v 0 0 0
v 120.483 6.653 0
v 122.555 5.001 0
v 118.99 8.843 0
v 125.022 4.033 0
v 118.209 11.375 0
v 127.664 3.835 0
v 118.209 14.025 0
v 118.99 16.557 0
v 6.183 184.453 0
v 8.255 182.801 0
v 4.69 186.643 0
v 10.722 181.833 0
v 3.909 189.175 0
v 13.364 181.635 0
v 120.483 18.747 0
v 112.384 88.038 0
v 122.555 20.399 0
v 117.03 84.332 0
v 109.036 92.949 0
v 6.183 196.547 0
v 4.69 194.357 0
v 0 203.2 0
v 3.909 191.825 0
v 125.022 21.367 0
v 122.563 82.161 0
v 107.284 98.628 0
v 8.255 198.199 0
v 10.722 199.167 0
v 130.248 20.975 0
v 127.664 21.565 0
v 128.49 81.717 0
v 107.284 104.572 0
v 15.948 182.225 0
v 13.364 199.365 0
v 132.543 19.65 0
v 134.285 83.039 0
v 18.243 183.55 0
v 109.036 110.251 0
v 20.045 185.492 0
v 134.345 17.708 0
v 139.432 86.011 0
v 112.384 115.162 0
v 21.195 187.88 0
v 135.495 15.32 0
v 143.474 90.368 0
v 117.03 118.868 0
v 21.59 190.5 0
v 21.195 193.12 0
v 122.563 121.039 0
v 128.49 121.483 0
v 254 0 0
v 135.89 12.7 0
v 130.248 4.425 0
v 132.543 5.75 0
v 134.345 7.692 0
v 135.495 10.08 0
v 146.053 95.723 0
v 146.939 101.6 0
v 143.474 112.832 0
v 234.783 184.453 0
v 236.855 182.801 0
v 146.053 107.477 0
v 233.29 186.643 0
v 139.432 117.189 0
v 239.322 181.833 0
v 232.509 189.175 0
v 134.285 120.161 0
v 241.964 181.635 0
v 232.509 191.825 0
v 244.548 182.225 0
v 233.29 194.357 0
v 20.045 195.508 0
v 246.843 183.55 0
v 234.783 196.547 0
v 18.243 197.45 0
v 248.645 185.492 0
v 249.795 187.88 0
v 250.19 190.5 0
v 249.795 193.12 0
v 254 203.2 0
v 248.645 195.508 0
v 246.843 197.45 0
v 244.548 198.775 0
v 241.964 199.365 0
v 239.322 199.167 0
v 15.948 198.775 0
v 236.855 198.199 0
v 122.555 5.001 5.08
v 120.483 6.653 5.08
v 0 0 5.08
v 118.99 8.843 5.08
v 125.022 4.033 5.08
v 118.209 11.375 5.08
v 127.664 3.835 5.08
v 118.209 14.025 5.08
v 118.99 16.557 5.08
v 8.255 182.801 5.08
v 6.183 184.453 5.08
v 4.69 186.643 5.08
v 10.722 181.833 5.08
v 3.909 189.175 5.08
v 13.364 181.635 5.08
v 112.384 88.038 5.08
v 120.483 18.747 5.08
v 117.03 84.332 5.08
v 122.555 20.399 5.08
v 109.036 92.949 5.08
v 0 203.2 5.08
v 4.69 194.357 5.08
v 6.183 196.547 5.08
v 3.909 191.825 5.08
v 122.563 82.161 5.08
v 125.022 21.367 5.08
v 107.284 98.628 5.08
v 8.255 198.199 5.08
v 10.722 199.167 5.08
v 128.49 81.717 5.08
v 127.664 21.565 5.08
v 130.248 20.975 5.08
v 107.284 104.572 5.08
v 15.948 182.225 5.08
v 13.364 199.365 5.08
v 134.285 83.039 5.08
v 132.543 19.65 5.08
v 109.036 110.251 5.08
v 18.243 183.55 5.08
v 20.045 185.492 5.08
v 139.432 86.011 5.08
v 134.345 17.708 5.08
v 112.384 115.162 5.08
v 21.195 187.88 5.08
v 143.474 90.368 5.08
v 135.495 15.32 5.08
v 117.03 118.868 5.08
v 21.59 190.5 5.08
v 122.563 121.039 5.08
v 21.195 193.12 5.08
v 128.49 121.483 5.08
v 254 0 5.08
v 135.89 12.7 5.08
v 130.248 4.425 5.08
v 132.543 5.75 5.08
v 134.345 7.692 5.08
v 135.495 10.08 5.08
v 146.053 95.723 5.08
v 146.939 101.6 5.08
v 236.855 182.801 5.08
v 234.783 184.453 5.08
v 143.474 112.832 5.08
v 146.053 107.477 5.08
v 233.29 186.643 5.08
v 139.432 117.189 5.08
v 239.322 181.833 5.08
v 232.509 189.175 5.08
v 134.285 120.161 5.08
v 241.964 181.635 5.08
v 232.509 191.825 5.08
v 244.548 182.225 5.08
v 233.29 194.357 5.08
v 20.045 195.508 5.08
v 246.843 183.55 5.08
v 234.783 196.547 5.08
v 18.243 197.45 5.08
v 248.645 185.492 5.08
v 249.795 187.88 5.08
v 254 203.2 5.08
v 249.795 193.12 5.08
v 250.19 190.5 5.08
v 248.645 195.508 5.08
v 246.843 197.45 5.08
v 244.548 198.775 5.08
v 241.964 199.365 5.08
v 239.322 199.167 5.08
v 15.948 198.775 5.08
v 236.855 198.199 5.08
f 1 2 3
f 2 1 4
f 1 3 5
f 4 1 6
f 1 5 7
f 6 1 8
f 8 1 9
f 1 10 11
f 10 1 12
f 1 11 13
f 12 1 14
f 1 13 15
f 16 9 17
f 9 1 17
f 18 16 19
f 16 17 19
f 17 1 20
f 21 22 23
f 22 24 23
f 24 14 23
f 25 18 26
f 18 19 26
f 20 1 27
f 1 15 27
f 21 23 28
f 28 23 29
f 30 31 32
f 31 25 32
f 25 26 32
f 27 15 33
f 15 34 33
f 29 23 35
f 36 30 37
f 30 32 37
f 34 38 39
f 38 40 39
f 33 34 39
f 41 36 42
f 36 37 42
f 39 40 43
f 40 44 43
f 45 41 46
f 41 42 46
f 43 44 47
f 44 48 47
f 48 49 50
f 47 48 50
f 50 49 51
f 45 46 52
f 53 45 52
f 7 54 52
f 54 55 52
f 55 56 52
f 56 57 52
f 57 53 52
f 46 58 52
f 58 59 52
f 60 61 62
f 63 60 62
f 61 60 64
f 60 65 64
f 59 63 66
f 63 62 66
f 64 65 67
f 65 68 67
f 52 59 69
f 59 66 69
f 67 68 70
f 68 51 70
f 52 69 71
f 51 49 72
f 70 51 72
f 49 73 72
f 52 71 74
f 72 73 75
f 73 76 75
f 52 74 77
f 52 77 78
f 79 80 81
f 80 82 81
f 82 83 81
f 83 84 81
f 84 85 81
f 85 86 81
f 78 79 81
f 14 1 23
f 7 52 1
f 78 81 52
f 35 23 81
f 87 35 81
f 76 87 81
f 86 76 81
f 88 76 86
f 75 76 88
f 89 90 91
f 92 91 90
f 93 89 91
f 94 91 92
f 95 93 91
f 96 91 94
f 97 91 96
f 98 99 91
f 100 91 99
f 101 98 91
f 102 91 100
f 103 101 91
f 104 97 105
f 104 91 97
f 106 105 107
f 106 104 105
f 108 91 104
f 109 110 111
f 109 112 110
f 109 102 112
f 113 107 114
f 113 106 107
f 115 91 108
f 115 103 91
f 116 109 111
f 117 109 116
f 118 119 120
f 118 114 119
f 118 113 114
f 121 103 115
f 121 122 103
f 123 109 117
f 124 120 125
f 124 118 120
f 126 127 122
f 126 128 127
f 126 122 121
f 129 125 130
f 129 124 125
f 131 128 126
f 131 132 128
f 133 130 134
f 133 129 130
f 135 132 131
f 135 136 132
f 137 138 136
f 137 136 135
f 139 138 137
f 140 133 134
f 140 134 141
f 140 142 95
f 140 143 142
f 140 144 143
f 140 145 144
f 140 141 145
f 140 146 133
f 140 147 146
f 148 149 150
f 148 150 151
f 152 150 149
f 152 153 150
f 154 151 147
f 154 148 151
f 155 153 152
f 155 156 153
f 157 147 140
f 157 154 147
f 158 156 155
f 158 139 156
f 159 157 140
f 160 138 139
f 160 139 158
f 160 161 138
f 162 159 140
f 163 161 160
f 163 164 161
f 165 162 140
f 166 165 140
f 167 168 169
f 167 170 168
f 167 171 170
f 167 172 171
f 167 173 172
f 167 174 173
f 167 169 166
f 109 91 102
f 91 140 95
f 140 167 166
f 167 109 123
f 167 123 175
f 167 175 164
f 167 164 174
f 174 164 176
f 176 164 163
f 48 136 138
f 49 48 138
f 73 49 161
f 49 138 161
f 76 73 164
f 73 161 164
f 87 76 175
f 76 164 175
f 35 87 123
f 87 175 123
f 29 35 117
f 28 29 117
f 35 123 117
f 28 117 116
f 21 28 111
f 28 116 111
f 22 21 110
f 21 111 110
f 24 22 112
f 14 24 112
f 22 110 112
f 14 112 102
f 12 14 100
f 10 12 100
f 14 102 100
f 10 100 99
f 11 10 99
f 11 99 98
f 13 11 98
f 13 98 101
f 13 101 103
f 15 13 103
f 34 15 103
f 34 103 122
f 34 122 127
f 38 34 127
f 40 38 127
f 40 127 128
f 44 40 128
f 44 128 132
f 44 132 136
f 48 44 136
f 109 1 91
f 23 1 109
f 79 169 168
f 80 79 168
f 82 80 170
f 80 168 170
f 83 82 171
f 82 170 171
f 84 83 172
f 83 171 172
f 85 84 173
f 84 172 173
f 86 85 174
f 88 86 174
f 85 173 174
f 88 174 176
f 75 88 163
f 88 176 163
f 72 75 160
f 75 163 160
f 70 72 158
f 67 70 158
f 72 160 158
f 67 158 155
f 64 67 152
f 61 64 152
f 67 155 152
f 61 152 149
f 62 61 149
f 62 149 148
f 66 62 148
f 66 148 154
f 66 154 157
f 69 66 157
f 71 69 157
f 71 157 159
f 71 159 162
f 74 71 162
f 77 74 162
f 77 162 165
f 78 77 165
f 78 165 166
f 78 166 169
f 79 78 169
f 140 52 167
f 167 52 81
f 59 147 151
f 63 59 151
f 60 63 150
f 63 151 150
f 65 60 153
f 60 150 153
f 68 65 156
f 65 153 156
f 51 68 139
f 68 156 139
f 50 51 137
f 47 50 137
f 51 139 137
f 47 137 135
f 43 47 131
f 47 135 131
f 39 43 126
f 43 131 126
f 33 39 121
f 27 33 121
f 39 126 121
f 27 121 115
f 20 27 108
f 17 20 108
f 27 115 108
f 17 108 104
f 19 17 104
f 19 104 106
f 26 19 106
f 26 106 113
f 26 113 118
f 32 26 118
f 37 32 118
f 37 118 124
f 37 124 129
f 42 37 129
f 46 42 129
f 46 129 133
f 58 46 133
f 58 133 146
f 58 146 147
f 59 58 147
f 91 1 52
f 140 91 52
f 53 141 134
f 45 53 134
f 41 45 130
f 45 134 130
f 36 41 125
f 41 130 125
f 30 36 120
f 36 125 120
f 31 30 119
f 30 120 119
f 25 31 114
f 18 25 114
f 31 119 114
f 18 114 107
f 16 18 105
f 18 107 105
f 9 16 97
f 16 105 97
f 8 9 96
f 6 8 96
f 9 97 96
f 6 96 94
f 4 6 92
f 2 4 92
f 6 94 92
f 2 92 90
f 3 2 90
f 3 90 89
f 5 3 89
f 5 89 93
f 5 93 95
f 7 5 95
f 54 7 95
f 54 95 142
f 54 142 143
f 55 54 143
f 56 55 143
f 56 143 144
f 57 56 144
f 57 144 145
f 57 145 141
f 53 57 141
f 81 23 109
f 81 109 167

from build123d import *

# Parameters (mm, degrees)
SKETCH2_W           = 254
SKETCH2_H           = 203.2
BOSS_EXTRUDE1_DEPTH = 5.08
SKETCH4_R           = 19.939
CUT_EXTRUDE2_DEPTH  = 326.318376979
SKETCH3_R           = 8.89
CUT_EXTRUDE3_DEPTH  = 326.318376979


with BuildPart() as part:
    # Sketch2 → Boss-Extrude1 (new body)
    with BuildSketch(Plane.XY):
        with Locations((127, 101.6)):
            Rectangle(SKETCH2_W, SKETCH2_H)
    extrude(amount=BOSS_EXTRUDE1_DEPTH)

    # Sketch4 → Cut-Extrude2 (cut, through all)
    with BuildSketch(Plane.XY.offset(5.08)):
        with Locations((127, 101.6)):
            Circle(SKETCH4_R)
    extrude(amount=-CUT_EXTRUDE2_DEPTH, mode=Mode.SUBTRACT)

    # Sketch3 → Cut-Extrude3 (cut, through all)
    with BuildSketch(Plane.XY.offset(5.08)):
        with Locations((12.7, 190.5)):
            Circle(SKETCH3_R)
        with Locations((241.3, 190.5)):
            Circle(SKETCH3_R)
        with Locations((127, 12.7)):
            Circle(SKETCH3_R)
    extrude(amount=-CUT_EXTRUDE3_DEPTH, mode=Mode.SUBTRACT)


solid = part.part
